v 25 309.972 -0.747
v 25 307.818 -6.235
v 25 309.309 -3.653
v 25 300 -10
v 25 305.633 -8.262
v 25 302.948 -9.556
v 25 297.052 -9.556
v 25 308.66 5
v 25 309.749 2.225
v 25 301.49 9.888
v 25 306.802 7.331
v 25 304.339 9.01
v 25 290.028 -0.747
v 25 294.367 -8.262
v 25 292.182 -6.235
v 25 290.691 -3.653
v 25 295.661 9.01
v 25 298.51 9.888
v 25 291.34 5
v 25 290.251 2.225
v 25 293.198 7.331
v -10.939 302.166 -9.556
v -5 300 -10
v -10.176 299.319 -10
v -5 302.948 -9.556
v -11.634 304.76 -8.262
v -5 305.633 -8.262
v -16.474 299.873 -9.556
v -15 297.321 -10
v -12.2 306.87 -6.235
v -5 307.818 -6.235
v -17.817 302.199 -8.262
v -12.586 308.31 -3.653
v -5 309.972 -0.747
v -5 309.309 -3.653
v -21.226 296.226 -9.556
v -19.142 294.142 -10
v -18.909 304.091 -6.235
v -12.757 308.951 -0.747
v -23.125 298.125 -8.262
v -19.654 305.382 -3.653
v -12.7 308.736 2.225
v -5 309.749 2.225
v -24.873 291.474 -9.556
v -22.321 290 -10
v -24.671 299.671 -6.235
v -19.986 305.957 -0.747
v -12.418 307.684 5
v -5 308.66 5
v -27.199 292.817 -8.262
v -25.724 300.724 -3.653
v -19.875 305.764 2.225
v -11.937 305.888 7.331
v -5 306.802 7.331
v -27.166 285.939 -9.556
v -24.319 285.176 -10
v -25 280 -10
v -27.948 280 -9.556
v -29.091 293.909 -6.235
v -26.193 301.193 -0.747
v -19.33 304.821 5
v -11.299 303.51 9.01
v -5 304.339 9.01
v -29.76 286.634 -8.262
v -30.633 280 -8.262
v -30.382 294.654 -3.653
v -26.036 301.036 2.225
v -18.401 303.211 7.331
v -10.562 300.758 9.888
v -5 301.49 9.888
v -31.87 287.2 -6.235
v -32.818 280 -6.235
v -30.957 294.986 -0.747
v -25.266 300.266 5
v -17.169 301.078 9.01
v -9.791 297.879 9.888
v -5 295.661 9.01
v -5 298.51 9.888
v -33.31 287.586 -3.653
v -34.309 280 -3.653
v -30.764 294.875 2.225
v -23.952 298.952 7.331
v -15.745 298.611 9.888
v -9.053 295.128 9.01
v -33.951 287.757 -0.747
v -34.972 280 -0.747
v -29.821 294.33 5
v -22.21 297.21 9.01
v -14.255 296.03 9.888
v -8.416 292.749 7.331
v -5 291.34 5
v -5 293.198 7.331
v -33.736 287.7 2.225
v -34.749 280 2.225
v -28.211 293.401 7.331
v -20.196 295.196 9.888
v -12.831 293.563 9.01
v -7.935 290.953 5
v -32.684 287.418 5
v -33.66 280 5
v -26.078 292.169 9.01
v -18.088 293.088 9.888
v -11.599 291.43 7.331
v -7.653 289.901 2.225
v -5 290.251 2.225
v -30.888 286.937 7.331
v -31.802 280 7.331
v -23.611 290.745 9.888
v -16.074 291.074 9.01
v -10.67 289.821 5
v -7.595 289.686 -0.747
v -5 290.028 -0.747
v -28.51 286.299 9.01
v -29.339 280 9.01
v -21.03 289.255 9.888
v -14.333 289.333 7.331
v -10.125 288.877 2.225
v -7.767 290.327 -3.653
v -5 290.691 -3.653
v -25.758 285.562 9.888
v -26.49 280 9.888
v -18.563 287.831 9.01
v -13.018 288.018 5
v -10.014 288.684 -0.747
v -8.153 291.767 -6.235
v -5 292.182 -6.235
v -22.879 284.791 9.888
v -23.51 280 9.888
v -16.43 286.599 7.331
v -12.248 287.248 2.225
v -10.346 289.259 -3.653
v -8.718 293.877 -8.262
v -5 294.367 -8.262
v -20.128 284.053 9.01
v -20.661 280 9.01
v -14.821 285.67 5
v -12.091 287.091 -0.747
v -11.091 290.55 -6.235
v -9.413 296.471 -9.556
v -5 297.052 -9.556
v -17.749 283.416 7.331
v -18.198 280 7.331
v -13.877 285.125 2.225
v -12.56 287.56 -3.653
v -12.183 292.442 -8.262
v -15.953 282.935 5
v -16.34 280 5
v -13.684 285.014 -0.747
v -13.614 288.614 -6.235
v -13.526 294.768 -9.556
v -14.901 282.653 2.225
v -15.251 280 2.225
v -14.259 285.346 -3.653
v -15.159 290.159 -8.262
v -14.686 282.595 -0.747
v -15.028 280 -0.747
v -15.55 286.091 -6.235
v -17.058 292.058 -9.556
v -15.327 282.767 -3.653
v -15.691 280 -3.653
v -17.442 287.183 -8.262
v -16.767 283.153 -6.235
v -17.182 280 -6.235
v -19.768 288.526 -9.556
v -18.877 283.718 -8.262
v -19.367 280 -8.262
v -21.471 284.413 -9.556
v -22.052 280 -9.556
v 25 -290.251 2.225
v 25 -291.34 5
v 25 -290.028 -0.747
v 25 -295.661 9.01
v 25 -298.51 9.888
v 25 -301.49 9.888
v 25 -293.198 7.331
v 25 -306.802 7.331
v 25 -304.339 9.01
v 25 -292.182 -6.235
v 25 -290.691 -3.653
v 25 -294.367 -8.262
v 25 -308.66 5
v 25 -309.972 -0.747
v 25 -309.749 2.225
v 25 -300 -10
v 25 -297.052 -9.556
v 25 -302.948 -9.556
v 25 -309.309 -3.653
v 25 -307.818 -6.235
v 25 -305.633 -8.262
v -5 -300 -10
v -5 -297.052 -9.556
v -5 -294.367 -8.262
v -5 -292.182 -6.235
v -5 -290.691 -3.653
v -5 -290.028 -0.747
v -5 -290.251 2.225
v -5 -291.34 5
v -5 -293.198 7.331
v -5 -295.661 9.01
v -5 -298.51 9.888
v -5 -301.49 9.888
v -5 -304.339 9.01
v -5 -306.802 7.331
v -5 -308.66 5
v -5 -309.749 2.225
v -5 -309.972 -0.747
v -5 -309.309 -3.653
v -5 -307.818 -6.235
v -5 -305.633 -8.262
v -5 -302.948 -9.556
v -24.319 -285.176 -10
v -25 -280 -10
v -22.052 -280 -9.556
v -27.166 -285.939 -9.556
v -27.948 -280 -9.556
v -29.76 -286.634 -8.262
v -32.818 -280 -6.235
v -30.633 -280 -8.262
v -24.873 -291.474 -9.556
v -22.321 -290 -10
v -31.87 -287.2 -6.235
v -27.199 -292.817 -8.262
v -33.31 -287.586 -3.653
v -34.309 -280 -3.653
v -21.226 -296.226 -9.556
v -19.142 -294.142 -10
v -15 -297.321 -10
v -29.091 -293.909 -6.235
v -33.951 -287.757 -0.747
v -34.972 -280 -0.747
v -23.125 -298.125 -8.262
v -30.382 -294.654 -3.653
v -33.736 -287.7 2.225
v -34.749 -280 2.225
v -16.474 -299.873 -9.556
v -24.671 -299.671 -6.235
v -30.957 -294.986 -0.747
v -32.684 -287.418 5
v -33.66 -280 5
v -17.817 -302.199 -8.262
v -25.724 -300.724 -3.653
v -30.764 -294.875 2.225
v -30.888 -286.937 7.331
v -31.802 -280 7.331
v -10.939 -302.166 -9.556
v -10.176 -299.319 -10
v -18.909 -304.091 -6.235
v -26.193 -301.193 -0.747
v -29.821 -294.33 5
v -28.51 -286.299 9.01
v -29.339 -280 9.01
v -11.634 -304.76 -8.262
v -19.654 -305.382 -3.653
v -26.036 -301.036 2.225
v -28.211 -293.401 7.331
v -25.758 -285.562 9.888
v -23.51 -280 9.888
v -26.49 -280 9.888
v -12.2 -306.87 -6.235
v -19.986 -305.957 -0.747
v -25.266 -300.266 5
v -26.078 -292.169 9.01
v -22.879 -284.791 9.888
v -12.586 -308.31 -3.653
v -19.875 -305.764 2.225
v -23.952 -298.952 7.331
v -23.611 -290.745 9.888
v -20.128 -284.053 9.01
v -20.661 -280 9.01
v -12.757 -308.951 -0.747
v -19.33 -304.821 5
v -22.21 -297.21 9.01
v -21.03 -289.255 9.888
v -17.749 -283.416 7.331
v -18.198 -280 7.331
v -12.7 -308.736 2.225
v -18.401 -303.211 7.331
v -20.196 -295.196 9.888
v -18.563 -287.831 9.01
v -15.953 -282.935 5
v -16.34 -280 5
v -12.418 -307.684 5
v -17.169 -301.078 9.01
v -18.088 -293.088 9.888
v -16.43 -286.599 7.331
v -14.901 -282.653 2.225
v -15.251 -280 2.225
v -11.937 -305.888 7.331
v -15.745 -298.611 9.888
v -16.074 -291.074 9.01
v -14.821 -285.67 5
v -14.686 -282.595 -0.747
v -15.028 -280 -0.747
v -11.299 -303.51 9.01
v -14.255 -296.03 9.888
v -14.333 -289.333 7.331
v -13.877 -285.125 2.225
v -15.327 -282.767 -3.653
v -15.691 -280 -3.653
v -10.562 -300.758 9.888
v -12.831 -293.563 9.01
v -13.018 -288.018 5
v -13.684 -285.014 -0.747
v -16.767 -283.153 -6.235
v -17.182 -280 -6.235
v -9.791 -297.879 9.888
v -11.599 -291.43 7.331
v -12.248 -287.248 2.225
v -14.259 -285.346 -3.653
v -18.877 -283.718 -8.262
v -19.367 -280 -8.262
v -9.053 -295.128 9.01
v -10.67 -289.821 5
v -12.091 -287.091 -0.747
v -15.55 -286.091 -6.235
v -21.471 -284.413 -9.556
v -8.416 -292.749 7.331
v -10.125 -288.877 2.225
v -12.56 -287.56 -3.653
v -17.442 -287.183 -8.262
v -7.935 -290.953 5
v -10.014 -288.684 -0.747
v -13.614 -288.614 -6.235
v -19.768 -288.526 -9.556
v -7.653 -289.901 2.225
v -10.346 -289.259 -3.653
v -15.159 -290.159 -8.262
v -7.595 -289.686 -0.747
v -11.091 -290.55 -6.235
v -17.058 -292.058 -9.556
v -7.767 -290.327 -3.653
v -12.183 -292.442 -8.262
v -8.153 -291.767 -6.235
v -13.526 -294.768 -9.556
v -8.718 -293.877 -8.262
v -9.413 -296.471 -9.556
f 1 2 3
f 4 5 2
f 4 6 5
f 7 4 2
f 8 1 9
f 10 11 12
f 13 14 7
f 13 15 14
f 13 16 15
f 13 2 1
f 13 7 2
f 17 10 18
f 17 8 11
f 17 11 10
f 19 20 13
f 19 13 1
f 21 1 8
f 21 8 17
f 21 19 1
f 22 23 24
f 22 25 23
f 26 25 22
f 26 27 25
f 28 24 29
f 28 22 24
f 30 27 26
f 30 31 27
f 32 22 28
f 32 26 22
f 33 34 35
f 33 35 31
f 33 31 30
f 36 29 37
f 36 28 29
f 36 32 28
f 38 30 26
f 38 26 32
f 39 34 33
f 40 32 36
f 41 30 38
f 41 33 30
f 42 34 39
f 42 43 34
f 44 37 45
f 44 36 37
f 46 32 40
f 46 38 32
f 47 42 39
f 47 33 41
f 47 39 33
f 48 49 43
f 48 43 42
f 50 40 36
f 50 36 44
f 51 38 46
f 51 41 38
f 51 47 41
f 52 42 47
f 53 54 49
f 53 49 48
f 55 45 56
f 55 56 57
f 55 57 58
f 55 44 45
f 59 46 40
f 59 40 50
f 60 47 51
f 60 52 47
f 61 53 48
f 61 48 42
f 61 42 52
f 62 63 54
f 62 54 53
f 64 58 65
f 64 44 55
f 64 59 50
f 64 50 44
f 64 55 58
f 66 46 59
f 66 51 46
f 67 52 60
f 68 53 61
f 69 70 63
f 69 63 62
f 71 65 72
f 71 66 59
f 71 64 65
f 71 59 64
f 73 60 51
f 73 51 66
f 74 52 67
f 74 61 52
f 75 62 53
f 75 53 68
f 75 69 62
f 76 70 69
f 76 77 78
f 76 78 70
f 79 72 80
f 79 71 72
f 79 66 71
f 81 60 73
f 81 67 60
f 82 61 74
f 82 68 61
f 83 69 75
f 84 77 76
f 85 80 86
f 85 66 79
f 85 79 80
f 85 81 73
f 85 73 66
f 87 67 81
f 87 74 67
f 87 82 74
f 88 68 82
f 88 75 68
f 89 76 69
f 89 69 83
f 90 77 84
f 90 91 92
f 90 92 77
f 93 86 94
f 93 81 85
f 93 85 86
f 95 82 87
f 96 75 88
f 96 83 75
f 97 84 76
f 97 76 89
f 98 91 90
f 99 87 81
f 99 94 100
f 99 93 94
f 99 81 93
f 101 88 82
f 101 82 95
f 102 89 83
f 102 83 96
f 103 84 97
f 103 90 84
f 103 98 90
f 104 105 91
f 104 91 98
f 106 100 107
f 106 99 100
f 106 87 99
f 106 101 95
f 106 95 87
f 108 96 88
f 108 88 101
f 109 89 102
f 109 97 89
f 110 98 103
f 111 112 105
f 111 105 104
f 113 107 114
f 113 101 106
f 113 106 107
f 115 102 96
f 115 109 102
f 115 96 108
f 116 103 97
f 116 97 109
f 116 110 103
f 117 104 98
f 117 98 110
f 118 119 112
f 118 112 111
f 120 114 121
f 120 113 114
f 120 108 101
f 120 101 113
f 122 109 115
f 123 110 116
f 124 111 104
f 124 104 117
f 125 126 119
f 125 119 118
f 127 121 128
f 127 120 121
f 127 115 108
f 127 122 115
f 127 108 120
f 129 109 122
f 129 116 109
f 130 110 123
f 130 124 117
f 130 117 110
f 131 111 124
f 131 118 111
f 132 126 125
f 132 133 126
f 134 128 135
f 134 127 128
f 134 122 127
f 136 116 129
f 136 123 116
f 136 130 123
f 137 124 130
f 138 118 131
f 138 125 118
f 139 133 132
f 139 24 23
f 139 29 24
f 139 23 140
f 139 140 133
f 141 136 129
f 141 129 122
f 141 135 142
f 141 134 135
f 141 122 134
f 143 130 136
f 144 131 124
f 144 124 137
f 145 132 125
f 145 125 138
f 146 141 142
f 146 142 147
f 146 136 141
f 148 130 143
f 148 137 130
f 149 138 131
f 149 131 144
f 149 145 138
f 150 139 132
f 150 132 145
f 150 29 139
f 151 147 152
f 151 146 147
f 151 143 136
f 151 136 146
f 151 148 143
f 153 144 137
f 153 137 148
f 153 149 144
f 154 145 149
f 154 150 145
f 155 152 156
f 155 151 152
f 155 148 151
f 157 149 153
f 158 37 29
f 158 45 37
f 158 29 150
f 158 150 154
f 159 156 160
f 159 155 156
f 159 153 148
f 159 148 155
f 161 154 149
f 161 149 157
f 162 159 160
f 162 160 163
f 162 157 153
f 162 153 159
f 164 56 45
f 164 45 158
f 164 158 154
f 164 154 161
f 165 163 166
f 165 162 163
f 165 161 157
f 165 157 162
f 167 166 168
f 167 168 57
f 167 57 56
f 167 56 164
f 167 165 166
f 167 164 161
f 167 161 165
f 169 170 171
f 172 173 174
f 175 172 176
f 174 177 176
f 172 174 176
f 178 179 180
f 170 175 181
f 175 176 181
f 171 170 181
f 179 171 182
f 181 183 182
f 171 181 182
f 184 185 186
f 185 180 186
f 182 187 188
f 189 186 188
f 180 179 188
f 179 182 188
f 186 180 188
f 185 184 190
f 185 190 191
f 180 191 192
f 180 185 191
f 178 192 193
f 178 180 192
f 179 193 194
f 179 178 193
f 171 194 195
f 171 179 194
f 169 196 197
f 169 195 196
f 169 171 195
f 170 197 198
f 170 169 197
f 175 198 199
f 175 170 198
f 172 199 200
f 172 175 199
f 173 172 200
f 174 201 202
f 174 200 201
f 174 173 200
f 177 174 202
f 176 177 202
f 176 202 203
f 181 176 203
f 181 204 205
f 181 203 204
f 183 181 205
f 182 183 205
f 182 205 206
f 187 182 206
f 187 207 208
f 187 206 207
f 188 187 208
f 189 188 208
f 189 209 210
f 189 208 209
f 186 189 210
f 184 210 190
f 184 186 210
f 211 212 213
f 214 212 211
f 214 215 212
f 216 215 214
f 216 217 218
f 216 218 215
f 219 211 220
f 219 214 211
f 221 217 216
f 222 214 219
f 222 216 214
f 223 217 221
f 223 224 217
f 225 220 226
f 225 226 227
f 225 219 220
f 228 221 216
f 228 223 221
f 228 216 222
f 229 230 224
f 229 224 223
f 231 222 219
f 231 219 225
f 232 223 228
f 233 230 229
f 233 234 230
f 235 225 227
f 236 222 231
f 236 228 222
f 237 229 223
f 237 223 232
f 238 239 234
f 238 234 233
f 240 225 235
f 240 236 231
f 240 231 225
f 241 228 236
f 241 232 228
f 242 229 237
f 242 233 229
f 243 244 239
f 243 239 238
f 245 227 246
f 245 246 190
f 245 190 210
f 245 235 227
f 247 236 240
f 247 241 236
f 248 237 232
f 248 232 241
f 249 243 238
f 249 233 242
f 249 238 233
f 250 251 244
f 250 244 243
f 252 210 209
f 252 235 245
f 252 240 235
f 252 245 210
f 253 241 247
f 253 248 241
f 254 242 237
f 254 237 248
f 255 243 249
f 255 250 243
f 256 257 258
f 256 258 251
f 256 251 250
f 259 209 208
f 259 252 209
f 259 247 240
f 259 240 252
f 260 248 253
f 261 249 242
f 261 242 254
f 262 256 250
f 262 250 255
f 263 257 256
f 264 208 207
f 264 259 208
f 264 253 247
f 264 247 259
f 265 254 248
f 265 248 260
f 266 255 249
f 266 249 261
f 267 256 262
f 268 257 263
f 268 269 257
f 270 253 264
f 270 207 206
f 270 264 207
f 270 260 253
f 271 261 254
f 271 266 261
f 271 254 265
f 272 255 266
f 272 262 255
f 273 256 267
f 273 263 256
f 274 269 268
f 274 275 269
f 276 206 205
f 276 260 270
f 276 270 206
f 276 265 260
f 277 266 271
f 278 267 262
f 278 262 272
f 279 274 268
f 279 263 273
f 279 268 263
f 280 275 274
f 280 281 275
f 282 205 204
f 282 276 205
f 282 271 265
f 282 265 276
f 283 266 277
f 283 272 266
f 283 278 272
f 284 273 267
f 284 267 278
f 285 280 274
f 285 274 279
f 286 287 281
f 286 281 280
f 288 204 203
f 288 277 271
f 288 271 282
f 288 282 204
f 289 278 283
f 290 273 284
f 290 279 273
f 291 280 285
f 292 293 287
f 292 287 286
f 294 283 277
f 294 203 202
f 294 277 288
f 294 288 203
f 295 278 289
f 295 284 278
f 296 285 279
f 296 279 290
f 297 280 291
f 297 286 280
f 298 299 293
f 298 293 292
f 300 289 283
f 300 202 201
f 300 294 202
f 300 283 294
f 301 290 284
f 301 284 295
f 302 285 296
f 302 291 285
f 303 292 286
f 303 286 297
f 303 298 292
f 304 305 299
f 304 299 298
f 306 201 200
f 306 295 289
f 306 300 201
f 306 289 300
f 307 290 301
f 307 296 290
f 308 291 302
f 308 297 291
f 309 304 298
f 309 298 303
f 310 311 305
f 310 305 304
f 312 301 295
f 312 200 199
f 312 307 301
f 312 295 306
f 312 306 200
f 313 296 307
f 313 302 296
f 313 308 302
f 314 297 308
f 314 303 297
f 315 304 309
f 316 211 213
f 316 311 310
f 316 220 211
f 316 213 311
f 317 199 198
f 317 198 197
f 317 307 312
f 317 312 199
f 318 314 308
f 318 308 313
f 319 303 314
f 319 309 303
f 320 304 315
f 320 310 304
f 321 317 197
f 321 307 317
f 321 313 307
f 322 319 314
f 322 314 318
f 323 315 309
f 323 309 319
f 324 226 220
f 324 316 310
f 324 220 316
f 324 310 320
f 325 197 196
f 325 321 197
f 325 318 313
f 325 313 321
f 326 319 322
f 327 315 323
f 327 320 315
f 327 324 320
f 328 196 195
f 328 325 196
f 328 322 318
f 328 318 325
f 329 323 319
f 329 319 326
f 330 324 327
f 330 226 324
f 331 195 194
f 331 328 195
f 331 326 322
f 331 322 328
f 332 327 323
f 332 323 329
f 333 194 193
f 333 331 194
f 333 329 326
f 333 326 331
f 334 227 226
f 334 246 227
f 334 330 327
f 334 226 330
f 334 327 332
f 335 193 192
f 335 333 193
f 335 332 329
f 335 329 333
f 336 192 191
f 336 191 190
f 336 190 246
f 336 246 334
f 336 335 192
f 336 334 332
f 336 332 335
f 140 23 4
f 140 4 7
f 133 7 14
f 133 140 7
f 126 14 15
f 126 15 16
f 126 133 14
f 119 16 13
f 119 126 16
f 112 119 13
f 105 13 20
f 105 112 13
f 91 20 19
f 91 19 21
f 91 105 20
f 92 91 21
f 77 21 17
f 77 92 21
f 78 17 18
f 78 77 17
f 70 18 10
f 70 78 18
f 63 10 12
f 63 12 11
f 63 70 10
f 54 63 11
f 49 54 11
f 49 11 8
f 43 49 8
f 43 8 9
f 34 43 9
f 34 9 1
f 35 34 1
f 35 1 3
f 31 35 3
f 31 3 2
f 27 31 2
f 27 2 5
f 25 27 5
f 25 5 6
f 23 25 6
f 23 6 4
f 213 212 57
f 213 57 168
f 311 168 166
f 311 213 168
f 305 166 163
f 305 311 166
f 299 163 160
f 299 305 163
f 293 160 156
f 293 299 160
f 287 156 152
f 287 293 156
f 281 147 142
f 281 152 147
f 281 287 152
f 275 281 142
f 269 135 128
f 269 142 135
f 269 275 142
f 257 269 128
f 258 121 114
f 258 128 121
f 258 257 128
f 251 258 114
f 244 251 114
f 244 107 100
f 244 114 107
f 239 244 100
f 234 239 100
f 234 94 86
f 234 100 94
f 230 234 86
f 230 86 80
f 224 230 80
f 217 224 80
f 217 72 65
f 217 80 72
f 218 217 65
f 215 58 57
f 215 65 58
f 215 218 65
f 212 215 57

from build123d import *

# Parameters (mm, degrees)
SKIZZE2_R = 10


with BuildPart() as part:
    # Austragung1: sweep along a path in Skizze1
    with BuildLine(Plane.XY) as austragung1_path:
        Line((25, 300), (-5, 300))
        ThreePointArc((-5, 300), (-19.142135624, 294.142135624), (-25, 280))
        Line((-25, 280), (-25, -280))
        ThreePointArc((-25, -280), (-19.142135624, -294.142135624), (-5, -300))
        Line((-5, -300), (25, -300))
    # Skizze2 → Austragung1 (sweep)
    with BuildSketch(Plane(origin=(25, 0, 0), x_dir=(0, 0, -1), z_dir=(1, 0, 0))):
        with Locations((0, 300)):
            Circle(SKIZZE2_R)
    sweep(path=austragung1_path.line)


solid = part.part
